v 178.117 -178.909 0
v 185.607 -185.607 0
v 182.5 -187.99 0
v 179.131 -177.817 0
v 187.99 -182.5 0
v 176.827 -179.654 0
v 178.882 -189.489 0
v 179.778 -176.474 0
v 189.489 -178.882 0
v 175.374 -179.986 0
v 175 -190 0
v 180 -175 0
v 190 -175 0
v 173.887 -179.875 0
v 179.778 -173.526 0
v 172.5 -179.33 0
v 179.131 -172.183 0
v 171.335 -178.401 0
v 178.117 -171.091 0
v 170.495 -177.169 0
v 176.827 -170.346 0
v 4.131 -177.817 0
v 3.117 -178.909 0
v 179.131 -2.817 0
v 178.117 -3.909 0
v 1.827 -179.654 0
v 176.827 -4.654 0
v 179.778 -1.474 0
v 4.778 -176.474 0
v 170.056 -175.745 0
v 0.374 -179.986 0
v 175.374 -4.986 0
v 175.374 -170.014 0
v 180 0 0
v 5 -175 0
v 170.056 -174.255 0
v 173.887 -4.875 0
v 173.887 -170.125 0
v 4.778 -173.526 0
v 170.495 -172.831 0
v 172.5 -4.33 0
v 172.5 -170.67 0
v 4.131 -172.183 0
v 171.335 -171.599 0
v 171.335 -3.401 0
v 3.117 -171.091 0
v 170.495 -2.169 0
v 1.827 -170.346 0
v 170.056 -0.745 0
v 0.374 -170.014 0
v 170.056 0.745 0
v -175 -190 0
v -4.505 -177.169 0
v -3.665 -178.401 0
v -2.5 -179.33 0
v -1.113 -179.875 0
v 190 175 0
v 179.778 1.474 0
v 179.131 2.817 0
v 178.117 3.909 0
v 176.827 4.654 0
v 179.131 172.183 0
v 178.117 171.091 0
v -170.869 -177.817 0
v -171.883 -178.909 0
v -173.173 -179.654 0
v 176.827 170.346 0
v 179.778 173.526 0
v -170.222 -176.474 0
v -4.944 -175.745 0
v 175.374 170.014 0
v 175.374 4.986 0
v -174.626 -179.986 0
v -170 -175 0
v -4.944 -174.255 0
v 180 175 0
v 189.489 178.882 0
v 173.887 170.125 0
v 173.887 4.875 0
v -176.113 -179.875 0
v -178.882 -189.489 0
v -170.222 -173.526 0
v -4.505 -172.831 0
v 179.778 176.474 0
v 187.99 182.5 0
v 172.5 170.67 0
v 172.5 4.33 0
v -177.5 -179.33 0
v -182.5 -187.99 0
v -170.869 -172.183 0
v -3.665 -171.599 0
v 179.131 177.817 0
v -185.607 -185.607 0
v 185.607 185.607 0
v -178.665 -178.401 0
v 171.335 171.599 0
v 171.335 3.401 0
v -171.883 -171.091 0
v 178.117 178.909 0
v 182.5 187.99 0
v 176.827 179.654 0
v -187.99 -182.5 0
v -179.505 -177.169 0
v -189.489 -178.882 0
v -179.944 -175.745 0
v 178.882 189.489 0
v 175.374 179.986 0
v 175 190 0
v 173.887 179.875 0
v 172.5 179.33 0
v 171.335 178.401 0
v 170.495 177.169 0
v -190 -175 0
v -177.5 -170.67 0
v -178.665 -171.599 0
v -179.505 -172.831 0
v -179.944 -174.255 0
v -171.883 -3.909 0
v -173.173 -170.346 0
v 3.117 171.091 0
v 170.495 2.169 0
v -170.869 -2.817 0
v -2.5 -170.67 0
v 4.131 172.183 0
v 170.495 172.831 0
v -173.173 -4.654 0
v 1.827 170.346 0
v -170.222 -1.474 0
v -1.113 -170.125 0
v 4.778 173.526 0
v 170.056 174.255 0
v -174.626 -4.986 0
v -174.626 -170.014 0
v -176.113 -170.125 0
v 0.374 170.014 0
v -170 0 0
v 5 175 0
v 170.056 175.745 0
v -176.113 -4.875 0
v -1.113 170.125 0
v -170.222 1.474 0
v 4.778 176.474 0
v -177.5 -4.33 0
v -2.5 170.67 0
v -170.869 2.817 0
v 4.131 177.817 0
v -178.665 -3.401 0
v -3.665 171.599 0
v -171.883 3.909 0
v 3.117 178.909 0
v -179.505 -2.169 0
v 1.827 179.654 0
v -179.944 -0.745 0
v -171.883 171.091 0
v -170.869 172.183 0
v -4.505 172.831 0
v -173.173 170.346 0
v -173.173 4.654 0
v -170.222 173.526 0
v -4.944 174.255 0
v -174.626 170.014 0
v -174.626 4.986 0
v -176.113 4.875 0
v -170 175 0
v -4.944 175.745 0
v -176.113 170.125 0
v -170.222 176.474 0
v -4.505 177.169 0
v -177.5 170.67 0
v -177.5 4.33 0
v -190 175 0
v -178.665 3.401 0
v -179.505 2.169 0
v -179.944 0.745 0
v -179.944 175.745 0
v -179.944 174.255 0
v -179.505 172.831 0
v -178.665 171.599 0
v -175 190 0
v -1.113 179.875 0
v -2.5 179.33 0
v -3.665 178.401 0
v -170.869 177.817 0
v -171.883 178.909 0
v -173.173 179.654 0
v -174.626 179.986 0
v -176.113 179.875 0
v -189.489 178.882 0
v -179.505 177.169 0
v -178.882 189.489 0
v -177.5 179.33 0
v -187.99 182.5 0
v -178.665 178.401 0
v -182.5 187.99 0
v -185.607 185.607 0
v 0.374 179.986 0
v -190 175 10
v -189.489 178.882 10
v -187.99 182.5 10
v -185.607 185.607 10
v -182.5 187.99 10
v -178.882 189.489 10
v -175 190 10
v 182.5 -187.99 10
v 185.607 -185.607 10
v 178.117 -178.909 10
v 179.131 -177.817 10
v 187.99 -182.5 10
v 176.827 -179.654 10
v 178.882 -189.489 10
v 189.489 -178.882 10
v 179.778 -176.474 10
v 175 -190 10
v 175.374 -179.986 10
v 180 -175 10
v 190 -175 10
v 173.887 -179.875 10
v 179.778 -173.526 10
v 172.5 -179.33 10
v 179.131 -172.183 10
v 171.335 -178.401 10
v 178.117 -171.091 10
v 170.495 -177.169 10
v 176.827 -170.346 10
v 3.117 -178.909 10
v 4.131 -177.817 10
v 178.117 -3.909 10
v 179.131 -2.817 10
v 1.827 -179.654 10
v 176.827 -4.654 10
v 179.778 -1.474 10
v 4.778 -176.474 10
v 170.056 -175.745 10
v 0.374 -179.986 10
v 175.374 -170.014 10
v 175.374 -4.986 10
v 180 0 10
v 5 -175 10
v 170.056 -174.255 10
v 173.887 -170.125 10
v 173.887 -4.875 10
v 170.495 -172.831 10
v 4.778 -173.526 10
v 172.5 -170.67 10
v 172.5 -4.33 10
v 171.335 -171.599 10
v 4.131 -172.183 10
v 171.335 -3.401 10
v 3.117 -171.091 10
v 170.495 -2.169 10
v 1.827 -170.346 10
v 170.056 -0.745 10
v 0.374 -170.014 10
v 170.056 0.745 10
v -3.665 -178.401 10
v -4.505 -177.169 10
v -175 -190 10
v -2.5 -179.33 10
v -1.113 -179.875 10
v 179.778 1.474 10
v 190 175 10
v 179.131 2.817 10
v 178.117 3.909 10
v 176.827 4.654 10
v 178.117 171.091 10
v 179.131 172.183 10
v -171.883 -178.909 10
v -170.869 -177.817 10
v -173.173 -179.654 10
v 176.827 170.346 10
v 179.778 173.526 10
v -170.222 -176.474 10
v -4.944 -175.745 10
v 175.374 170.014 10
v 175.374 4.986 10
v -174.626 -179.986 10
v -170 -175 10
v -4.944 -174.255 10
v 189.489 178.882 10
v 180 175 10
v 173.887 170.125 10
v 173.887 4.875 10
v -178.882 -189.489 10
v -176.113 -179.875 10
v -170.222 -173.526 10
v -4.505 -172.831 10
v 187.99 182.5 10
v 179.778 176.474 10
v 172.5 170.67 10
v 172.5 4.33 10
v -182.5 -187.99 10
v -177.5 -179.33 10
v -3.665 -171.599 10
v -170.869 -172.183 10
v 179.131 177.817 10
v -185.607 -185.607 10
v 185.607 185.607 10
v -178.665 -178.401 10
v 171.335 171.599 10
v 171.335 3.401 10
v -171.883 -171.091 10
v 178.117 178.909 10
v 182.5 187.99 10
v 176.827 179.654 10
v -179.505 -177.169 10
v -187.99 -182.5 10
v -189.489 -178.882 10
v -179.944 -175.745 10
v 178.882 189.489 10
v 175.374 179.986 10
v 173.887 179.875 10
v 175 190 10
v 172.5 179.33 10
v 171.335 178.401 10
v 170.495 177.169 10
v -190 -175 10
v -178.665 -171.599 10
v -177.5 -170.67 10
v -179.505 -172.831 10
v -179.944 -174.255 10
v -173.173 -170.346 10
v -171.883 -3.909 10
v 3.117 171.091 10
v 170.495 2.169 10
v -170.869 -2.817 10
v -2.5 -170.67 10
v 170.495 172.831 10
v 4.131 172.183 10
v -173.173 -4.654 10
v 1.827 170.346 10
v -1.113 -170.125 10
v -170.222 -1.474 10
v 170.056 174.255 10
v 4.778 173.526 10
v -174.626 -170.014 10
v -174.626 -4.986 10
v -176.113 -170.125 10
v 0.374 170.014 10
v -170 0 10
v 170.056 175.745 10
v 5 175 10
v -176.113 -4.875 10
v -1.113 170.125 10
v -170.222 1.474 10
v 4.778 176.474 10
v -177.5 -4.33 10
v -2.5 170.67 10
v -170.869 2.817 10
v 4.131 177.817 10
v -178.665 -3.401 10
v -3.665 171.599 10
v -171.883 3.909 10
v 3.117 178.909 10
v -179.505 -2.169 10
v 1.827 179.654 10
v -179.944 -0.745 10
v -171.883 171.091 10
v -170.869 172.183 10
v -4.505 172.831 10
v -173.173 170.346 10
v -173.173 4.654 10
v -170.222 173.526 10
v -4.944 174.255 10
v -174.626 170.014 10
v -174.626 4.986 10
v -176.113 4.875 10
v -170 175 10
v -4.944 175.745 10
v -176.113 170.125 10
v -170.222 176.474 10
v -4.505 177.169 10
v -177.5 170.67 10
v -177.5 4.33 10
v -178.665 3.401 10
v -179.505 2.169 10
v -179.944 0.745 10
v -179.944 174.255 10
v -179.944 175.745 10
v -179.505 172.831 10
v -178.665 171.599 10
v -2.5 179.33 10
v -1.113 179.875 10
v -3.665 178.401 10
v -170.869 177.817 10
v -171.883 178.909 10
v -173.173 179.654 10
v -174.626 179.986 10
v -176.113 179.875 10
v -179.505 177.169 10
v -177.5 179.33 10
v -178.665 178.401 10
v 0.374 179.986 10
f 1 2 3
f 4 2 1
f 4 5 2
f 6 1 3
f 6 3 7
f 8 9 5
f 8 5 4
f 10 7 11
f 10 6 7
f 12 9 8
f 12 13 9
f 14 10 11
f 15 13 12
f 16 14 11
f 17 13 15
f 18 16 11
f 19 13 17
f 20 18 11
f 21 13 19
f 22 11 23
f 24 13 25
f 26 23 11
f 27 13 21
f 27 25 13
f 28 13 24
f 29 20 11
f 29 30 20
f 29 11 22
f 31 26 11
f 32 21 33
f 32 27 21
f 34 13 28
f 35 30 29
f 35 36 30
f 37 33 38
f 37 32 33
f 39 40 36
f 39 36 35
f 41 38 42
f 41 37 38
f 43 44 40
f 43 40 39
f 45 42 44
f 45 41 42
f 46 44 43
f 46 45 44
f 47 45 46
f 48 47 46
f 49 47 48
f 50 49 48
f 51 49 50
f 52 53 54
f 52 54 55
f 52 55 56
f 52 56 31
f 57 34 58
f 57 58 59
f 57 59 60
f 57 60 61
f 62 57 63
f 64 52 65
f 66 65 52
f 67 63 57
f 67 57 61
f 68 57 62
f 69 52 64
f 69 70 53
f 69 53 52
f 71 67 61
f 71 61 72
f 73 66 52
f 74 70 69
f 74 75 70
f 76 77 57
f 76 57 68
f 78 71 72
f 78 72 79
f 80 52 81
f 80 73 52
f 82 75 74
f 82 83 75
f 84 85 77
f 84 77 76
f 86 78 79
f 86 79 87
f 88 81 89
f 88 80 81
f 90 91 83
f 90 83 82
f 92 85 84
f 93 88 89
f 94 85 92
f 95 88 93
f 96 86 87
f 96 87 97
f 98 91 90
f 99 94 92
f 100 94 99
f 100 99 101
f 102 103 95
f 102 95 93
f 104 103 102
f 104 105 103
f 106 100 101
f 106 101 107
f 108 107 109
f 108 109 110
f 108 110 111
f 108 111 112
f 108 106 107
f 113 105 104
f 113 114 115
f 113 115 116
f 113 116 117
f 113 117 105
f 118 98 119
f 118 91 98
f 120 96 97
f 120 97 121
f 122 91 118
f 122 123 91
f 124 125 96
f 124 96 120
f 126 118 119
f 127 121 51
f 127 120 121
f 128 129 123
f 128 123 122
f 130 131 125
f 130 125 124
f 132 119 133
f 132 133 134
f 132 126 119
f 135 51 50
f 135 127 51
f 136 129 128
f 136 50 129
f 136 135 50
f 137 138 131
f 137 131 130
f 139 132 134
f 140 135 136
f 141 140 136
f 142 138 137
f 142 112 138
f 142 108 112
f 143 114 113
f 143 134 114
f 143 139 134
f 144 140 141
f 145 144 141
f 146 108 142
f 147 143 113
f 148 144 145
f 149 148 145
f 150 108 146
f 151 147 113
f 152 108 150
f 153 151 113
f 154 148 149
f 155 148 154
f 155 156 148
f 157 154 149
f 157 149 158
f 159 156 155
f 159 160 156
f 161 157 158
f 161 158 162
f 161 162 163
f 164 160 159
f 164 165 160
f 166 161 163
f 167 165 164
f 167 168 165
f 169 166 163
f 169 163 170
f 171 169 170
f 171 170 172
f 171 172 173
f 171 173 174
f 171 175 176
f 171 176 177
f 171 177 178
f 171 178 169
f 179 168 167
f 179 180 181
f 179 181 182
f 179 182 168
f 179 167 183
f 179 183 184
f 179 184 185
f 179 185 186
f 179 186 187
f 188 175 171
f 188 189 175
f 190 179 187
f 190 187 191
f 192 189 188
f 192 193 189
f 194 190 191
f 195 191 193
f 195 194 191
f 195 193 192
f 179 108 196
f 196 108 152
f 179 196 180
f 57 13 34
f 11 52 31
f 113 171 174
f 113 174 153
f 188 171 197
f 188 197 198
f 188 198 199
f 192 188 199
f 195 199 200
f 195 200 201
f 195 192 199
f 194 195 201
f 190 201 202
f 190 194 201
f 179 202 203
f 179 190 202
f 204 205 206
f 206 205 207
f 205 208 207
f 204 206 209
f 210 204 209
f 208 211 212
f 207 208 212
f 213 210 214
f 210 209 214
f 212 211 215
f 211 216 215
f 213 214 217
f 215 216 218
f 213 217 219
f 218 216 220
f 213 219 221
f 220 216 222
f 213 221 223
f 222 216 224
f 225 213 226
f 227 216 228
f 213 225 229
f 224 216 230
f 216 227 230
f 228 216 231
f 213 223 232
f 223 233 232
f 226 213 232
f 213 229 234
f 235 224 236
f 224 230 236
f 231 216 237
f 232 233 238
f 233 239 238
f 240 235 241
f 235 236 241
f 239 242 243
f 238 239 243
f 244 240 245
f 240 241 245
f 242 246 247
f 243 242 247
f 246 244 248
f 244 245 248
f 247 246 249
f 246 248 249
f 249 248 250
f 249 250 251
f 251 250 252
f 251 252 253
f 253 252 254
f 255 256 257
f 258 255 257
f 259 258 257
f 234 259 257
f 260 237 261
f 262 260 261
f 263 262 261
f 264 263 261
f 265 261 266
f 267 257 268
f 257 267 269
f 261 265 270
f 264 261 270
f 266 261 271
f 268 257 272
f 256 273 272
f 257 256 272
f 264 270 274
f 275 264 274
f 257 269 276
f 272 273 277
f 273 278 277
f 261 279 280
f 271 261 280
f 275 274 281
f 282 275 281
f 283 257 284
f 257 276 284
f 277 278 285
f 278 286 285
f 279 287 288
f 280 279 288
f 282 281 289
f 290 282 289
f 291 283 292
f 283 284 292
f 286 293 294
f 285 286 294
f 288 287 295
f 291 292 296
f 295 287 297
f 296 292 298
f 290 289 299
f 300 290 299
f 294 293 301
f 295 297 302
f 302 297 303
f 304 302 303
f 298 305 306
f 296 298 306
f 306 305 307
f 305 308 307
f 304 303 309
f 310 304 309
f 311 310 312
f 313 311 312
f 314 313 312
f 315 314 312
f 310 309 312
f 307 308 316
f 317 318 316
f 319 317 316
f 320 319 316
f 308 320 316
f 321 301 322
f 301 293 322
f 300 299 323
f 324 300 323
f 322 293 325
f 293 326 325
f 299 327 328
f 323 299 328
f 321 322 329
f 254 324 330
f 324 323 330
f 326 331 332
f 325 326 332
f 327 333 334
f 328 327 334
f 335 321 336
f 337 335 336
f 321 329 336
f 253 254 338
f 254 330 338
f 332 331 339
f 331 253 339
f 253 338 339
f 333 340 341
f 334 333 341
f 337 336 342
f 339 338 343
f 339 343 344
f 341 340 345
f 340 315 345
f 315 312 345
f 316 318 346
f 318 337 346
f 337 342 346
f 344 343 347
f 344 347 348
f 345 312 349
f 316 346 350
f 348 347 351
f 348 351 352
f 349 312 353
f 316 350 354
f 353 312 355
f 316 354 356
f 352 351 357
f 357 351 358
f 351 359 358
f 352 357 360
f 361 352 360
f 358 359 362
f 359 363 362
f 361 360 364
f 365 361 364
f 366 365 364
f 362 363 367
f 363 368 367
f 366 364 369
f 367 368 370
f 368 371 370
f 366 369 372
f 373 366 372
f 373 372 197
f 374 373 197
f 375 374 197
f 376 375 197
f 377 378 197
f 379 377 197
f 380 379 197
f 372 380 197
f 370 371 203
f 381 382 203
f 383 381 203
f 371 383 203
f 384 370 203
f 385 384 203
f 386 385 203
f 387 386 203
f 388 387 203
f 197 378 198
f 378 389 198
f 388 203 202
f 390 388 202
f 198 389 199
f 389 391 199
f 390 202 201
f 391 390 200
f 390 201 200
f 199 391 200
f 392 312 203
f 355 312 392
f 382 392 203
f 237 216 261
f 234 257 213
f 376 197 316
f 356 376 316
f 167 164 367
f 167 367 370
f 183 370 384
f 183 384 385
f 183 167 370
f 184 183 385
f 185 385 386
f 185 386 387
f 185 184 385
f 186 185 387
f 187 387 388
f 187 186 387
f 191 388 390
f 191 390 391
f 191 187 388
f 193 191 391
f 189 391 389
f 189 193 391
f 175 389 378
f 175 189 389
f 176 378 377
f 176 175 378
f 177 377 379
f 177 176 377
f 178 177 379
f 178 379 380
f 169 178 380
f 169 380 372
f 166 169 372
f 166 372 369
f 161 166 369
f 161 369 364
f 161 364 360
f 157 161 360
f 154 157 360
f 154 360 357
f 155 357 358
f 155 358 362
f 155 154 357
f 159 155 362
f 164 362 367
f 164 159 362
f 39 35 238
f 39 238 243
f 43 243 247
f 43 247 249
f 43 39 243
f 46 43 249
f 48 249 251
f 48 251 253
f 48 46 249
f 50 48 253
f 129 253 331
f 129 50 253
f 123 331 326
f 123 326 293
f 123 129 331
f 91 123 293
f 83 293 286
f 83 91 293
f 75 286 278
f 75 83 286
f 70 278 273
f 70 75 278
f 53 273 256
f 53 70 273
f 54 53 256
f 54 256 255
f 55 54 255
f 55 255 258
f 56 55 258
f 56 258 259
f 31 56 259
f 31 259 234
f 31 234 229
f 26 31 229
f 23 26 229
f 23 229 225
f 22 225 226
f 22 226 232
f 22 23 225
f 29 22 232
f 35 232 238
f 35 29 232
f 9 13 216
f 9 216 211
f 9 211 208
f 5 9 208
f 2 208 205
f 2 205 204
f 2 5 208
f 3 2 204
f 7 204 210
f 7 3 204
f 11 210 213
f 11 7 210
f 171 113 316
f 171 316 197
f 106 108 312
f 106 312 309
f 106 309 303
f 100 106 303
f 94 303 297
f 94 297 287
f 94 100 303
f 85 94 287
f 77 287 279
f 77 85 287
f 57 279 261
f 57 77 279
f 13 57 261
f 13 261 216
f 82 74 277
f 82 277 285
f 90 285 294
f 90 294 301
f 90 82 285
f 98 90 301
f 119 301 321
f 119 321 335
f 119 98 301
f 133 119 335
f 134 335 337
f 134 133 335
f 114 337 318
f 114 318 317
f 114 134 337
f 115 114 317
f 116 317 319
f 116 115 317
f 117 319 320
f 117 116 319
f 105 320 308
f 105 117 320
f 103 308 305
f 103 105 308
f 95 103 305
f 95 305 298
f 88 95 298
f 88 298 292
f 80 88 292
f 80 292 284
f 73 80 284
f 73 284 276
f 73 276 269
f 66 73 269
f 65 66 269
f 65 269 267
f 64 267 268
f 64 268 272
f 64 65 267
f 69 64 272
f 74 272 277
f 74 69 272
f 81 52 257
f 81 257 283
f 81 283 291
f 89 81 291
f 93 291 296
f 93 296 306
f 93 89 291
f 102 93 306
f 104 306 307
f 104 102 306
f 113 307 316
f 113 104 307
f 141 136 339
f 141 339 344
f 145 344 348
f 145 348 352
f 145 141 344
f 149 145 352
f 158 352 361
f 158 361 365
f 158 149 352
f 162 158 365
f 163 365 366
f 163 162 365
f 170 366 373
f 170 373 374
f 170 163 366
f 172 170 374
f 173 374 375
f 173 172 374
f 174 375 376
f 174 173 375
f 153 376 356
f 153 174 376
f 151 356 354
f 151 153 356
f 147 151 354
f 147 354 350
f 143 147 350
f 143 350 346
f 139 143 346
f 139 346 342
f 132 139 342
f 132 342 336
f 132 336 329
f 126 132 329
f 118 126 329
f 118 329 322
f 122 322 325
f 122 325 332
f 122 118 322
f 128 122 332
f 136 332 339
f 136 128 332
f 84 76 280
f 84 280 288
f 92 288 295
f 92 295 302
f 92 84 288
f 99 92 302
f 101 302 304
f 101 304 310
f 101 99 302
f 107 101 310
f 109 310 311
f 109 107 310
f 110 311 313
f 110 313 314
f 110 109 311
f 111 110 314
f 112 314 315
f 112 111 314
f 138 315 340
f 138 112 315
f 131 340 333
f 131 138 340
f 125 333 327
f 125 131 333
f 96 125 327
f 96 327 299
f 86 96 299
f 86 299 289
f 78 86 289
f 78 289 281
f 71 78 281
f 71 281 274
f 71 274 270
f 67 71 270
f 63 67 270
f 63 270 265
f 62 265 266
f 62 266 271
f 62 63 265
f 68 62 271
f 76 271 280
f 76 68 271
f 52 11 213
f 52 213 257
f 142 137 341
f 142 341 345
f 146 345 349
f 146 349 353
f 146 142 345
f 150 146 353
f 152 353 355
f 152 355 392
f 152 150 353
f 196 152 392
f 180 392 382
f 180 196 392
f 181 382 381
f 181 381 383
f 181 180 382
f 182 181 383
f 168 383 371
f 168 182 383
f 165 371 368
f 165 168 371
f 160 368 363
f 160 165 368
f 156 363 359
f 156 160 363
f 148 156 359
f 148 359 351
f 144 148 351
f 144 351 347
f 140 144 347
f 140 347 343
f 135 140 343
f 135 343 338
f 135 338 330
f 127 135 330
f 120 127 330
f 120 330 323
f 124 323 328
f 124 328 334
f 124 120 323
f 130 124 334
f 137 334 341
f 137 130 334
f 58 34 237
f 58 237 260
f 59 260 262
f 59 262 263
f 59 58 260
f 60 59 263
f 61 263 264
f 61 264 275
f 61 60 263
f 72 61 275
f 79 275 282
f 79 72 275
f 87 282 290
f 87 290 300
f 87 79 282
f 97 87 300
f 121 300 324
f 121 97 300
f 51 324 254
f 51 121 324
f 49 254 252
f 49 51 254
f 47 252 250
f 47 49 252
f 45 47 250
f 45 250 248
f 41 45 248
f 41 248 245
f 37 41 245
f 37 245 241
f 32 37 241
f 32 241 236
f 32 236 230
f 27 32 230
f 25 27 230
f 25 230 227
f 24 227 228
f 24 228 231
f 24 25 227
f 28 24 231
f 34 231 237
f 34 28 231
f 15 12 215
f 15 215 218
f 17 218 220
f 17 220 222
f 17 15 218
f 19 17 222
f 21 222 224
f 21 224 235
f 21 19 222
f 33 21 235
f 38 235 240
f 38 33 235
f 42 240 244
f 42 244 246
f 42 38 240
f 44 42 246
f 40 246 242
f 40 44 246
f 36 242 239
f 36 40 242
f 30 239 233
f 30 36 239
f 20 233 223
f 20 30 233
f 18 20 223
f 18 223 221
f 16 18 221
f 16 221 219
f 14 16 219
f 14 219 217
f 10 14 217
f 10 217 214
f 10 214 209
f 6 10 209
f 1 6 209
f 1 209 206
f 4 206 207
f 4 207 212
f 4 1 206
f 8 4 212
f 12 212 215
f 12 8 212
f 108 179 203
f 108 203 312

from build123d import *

# Parameters (mm, degrees)
SKETCH2_R           = 5
BOSS_EXTRUDE1_DEPTH = 10


with BuildPart() as part:
    # Sketch2 → Boss-Extrude1 (new body)
    with BuildSketch(Plane.XY):
        with BuildLine():
            Line((-175, 190), (175, 190))
            ThreePointArc((175, 190), (185.606601718, 185.606601718), (190, 175))
            Line((190, 175), (190, -175))
            ThreePointArc((190, -175), (185.606601718, -185.606601718), (175, -190))
            Line((175, -190), (-175, -190))
            ThreePointArc((-175, -190), (-185.606601718, -185.606601718), (-190, -175))
            Line((-190, -175), (-190, 175))
            ThreePointArc((-190, 175), (-185.606601718, 185.606601718), (-175, 190))
        make_face()
        with Locations((-175, 175)):
            Circle(SKETCH2_R, mode=Mode.SUBTRACT)
        with Locations((0, 175)):
            Circle(SKETCH2_R, mode=Mode.SUBTRACT)
        with Locations((175, 175)):
            Circle(SKETCH2_R, mode=Mode.SUBTRACT)
        with Locations((175, 0)):
            Circle(SKETCH2_R, mode=Mode.SUBTRACT)
        with Locations((-175, 0)):
            Circle(SKETCH2_R, mode=Mode.SUBTRACT)
        with Locations((-175, -175)):
            Circle(SKETCH2_R, mode=Mode.SUBTRACT)
        with Locations((0, -175)):
            Circle(SKETCH2_R, mode=Mode.SUBTRACT)
        with Locations((175, -175)):
            Circle(SKETCH2_R, mode=Mode.SUBTRACT)
    extrude(amount=BOSS_EXTRUDE1_DEPTH)


solid = part.part
